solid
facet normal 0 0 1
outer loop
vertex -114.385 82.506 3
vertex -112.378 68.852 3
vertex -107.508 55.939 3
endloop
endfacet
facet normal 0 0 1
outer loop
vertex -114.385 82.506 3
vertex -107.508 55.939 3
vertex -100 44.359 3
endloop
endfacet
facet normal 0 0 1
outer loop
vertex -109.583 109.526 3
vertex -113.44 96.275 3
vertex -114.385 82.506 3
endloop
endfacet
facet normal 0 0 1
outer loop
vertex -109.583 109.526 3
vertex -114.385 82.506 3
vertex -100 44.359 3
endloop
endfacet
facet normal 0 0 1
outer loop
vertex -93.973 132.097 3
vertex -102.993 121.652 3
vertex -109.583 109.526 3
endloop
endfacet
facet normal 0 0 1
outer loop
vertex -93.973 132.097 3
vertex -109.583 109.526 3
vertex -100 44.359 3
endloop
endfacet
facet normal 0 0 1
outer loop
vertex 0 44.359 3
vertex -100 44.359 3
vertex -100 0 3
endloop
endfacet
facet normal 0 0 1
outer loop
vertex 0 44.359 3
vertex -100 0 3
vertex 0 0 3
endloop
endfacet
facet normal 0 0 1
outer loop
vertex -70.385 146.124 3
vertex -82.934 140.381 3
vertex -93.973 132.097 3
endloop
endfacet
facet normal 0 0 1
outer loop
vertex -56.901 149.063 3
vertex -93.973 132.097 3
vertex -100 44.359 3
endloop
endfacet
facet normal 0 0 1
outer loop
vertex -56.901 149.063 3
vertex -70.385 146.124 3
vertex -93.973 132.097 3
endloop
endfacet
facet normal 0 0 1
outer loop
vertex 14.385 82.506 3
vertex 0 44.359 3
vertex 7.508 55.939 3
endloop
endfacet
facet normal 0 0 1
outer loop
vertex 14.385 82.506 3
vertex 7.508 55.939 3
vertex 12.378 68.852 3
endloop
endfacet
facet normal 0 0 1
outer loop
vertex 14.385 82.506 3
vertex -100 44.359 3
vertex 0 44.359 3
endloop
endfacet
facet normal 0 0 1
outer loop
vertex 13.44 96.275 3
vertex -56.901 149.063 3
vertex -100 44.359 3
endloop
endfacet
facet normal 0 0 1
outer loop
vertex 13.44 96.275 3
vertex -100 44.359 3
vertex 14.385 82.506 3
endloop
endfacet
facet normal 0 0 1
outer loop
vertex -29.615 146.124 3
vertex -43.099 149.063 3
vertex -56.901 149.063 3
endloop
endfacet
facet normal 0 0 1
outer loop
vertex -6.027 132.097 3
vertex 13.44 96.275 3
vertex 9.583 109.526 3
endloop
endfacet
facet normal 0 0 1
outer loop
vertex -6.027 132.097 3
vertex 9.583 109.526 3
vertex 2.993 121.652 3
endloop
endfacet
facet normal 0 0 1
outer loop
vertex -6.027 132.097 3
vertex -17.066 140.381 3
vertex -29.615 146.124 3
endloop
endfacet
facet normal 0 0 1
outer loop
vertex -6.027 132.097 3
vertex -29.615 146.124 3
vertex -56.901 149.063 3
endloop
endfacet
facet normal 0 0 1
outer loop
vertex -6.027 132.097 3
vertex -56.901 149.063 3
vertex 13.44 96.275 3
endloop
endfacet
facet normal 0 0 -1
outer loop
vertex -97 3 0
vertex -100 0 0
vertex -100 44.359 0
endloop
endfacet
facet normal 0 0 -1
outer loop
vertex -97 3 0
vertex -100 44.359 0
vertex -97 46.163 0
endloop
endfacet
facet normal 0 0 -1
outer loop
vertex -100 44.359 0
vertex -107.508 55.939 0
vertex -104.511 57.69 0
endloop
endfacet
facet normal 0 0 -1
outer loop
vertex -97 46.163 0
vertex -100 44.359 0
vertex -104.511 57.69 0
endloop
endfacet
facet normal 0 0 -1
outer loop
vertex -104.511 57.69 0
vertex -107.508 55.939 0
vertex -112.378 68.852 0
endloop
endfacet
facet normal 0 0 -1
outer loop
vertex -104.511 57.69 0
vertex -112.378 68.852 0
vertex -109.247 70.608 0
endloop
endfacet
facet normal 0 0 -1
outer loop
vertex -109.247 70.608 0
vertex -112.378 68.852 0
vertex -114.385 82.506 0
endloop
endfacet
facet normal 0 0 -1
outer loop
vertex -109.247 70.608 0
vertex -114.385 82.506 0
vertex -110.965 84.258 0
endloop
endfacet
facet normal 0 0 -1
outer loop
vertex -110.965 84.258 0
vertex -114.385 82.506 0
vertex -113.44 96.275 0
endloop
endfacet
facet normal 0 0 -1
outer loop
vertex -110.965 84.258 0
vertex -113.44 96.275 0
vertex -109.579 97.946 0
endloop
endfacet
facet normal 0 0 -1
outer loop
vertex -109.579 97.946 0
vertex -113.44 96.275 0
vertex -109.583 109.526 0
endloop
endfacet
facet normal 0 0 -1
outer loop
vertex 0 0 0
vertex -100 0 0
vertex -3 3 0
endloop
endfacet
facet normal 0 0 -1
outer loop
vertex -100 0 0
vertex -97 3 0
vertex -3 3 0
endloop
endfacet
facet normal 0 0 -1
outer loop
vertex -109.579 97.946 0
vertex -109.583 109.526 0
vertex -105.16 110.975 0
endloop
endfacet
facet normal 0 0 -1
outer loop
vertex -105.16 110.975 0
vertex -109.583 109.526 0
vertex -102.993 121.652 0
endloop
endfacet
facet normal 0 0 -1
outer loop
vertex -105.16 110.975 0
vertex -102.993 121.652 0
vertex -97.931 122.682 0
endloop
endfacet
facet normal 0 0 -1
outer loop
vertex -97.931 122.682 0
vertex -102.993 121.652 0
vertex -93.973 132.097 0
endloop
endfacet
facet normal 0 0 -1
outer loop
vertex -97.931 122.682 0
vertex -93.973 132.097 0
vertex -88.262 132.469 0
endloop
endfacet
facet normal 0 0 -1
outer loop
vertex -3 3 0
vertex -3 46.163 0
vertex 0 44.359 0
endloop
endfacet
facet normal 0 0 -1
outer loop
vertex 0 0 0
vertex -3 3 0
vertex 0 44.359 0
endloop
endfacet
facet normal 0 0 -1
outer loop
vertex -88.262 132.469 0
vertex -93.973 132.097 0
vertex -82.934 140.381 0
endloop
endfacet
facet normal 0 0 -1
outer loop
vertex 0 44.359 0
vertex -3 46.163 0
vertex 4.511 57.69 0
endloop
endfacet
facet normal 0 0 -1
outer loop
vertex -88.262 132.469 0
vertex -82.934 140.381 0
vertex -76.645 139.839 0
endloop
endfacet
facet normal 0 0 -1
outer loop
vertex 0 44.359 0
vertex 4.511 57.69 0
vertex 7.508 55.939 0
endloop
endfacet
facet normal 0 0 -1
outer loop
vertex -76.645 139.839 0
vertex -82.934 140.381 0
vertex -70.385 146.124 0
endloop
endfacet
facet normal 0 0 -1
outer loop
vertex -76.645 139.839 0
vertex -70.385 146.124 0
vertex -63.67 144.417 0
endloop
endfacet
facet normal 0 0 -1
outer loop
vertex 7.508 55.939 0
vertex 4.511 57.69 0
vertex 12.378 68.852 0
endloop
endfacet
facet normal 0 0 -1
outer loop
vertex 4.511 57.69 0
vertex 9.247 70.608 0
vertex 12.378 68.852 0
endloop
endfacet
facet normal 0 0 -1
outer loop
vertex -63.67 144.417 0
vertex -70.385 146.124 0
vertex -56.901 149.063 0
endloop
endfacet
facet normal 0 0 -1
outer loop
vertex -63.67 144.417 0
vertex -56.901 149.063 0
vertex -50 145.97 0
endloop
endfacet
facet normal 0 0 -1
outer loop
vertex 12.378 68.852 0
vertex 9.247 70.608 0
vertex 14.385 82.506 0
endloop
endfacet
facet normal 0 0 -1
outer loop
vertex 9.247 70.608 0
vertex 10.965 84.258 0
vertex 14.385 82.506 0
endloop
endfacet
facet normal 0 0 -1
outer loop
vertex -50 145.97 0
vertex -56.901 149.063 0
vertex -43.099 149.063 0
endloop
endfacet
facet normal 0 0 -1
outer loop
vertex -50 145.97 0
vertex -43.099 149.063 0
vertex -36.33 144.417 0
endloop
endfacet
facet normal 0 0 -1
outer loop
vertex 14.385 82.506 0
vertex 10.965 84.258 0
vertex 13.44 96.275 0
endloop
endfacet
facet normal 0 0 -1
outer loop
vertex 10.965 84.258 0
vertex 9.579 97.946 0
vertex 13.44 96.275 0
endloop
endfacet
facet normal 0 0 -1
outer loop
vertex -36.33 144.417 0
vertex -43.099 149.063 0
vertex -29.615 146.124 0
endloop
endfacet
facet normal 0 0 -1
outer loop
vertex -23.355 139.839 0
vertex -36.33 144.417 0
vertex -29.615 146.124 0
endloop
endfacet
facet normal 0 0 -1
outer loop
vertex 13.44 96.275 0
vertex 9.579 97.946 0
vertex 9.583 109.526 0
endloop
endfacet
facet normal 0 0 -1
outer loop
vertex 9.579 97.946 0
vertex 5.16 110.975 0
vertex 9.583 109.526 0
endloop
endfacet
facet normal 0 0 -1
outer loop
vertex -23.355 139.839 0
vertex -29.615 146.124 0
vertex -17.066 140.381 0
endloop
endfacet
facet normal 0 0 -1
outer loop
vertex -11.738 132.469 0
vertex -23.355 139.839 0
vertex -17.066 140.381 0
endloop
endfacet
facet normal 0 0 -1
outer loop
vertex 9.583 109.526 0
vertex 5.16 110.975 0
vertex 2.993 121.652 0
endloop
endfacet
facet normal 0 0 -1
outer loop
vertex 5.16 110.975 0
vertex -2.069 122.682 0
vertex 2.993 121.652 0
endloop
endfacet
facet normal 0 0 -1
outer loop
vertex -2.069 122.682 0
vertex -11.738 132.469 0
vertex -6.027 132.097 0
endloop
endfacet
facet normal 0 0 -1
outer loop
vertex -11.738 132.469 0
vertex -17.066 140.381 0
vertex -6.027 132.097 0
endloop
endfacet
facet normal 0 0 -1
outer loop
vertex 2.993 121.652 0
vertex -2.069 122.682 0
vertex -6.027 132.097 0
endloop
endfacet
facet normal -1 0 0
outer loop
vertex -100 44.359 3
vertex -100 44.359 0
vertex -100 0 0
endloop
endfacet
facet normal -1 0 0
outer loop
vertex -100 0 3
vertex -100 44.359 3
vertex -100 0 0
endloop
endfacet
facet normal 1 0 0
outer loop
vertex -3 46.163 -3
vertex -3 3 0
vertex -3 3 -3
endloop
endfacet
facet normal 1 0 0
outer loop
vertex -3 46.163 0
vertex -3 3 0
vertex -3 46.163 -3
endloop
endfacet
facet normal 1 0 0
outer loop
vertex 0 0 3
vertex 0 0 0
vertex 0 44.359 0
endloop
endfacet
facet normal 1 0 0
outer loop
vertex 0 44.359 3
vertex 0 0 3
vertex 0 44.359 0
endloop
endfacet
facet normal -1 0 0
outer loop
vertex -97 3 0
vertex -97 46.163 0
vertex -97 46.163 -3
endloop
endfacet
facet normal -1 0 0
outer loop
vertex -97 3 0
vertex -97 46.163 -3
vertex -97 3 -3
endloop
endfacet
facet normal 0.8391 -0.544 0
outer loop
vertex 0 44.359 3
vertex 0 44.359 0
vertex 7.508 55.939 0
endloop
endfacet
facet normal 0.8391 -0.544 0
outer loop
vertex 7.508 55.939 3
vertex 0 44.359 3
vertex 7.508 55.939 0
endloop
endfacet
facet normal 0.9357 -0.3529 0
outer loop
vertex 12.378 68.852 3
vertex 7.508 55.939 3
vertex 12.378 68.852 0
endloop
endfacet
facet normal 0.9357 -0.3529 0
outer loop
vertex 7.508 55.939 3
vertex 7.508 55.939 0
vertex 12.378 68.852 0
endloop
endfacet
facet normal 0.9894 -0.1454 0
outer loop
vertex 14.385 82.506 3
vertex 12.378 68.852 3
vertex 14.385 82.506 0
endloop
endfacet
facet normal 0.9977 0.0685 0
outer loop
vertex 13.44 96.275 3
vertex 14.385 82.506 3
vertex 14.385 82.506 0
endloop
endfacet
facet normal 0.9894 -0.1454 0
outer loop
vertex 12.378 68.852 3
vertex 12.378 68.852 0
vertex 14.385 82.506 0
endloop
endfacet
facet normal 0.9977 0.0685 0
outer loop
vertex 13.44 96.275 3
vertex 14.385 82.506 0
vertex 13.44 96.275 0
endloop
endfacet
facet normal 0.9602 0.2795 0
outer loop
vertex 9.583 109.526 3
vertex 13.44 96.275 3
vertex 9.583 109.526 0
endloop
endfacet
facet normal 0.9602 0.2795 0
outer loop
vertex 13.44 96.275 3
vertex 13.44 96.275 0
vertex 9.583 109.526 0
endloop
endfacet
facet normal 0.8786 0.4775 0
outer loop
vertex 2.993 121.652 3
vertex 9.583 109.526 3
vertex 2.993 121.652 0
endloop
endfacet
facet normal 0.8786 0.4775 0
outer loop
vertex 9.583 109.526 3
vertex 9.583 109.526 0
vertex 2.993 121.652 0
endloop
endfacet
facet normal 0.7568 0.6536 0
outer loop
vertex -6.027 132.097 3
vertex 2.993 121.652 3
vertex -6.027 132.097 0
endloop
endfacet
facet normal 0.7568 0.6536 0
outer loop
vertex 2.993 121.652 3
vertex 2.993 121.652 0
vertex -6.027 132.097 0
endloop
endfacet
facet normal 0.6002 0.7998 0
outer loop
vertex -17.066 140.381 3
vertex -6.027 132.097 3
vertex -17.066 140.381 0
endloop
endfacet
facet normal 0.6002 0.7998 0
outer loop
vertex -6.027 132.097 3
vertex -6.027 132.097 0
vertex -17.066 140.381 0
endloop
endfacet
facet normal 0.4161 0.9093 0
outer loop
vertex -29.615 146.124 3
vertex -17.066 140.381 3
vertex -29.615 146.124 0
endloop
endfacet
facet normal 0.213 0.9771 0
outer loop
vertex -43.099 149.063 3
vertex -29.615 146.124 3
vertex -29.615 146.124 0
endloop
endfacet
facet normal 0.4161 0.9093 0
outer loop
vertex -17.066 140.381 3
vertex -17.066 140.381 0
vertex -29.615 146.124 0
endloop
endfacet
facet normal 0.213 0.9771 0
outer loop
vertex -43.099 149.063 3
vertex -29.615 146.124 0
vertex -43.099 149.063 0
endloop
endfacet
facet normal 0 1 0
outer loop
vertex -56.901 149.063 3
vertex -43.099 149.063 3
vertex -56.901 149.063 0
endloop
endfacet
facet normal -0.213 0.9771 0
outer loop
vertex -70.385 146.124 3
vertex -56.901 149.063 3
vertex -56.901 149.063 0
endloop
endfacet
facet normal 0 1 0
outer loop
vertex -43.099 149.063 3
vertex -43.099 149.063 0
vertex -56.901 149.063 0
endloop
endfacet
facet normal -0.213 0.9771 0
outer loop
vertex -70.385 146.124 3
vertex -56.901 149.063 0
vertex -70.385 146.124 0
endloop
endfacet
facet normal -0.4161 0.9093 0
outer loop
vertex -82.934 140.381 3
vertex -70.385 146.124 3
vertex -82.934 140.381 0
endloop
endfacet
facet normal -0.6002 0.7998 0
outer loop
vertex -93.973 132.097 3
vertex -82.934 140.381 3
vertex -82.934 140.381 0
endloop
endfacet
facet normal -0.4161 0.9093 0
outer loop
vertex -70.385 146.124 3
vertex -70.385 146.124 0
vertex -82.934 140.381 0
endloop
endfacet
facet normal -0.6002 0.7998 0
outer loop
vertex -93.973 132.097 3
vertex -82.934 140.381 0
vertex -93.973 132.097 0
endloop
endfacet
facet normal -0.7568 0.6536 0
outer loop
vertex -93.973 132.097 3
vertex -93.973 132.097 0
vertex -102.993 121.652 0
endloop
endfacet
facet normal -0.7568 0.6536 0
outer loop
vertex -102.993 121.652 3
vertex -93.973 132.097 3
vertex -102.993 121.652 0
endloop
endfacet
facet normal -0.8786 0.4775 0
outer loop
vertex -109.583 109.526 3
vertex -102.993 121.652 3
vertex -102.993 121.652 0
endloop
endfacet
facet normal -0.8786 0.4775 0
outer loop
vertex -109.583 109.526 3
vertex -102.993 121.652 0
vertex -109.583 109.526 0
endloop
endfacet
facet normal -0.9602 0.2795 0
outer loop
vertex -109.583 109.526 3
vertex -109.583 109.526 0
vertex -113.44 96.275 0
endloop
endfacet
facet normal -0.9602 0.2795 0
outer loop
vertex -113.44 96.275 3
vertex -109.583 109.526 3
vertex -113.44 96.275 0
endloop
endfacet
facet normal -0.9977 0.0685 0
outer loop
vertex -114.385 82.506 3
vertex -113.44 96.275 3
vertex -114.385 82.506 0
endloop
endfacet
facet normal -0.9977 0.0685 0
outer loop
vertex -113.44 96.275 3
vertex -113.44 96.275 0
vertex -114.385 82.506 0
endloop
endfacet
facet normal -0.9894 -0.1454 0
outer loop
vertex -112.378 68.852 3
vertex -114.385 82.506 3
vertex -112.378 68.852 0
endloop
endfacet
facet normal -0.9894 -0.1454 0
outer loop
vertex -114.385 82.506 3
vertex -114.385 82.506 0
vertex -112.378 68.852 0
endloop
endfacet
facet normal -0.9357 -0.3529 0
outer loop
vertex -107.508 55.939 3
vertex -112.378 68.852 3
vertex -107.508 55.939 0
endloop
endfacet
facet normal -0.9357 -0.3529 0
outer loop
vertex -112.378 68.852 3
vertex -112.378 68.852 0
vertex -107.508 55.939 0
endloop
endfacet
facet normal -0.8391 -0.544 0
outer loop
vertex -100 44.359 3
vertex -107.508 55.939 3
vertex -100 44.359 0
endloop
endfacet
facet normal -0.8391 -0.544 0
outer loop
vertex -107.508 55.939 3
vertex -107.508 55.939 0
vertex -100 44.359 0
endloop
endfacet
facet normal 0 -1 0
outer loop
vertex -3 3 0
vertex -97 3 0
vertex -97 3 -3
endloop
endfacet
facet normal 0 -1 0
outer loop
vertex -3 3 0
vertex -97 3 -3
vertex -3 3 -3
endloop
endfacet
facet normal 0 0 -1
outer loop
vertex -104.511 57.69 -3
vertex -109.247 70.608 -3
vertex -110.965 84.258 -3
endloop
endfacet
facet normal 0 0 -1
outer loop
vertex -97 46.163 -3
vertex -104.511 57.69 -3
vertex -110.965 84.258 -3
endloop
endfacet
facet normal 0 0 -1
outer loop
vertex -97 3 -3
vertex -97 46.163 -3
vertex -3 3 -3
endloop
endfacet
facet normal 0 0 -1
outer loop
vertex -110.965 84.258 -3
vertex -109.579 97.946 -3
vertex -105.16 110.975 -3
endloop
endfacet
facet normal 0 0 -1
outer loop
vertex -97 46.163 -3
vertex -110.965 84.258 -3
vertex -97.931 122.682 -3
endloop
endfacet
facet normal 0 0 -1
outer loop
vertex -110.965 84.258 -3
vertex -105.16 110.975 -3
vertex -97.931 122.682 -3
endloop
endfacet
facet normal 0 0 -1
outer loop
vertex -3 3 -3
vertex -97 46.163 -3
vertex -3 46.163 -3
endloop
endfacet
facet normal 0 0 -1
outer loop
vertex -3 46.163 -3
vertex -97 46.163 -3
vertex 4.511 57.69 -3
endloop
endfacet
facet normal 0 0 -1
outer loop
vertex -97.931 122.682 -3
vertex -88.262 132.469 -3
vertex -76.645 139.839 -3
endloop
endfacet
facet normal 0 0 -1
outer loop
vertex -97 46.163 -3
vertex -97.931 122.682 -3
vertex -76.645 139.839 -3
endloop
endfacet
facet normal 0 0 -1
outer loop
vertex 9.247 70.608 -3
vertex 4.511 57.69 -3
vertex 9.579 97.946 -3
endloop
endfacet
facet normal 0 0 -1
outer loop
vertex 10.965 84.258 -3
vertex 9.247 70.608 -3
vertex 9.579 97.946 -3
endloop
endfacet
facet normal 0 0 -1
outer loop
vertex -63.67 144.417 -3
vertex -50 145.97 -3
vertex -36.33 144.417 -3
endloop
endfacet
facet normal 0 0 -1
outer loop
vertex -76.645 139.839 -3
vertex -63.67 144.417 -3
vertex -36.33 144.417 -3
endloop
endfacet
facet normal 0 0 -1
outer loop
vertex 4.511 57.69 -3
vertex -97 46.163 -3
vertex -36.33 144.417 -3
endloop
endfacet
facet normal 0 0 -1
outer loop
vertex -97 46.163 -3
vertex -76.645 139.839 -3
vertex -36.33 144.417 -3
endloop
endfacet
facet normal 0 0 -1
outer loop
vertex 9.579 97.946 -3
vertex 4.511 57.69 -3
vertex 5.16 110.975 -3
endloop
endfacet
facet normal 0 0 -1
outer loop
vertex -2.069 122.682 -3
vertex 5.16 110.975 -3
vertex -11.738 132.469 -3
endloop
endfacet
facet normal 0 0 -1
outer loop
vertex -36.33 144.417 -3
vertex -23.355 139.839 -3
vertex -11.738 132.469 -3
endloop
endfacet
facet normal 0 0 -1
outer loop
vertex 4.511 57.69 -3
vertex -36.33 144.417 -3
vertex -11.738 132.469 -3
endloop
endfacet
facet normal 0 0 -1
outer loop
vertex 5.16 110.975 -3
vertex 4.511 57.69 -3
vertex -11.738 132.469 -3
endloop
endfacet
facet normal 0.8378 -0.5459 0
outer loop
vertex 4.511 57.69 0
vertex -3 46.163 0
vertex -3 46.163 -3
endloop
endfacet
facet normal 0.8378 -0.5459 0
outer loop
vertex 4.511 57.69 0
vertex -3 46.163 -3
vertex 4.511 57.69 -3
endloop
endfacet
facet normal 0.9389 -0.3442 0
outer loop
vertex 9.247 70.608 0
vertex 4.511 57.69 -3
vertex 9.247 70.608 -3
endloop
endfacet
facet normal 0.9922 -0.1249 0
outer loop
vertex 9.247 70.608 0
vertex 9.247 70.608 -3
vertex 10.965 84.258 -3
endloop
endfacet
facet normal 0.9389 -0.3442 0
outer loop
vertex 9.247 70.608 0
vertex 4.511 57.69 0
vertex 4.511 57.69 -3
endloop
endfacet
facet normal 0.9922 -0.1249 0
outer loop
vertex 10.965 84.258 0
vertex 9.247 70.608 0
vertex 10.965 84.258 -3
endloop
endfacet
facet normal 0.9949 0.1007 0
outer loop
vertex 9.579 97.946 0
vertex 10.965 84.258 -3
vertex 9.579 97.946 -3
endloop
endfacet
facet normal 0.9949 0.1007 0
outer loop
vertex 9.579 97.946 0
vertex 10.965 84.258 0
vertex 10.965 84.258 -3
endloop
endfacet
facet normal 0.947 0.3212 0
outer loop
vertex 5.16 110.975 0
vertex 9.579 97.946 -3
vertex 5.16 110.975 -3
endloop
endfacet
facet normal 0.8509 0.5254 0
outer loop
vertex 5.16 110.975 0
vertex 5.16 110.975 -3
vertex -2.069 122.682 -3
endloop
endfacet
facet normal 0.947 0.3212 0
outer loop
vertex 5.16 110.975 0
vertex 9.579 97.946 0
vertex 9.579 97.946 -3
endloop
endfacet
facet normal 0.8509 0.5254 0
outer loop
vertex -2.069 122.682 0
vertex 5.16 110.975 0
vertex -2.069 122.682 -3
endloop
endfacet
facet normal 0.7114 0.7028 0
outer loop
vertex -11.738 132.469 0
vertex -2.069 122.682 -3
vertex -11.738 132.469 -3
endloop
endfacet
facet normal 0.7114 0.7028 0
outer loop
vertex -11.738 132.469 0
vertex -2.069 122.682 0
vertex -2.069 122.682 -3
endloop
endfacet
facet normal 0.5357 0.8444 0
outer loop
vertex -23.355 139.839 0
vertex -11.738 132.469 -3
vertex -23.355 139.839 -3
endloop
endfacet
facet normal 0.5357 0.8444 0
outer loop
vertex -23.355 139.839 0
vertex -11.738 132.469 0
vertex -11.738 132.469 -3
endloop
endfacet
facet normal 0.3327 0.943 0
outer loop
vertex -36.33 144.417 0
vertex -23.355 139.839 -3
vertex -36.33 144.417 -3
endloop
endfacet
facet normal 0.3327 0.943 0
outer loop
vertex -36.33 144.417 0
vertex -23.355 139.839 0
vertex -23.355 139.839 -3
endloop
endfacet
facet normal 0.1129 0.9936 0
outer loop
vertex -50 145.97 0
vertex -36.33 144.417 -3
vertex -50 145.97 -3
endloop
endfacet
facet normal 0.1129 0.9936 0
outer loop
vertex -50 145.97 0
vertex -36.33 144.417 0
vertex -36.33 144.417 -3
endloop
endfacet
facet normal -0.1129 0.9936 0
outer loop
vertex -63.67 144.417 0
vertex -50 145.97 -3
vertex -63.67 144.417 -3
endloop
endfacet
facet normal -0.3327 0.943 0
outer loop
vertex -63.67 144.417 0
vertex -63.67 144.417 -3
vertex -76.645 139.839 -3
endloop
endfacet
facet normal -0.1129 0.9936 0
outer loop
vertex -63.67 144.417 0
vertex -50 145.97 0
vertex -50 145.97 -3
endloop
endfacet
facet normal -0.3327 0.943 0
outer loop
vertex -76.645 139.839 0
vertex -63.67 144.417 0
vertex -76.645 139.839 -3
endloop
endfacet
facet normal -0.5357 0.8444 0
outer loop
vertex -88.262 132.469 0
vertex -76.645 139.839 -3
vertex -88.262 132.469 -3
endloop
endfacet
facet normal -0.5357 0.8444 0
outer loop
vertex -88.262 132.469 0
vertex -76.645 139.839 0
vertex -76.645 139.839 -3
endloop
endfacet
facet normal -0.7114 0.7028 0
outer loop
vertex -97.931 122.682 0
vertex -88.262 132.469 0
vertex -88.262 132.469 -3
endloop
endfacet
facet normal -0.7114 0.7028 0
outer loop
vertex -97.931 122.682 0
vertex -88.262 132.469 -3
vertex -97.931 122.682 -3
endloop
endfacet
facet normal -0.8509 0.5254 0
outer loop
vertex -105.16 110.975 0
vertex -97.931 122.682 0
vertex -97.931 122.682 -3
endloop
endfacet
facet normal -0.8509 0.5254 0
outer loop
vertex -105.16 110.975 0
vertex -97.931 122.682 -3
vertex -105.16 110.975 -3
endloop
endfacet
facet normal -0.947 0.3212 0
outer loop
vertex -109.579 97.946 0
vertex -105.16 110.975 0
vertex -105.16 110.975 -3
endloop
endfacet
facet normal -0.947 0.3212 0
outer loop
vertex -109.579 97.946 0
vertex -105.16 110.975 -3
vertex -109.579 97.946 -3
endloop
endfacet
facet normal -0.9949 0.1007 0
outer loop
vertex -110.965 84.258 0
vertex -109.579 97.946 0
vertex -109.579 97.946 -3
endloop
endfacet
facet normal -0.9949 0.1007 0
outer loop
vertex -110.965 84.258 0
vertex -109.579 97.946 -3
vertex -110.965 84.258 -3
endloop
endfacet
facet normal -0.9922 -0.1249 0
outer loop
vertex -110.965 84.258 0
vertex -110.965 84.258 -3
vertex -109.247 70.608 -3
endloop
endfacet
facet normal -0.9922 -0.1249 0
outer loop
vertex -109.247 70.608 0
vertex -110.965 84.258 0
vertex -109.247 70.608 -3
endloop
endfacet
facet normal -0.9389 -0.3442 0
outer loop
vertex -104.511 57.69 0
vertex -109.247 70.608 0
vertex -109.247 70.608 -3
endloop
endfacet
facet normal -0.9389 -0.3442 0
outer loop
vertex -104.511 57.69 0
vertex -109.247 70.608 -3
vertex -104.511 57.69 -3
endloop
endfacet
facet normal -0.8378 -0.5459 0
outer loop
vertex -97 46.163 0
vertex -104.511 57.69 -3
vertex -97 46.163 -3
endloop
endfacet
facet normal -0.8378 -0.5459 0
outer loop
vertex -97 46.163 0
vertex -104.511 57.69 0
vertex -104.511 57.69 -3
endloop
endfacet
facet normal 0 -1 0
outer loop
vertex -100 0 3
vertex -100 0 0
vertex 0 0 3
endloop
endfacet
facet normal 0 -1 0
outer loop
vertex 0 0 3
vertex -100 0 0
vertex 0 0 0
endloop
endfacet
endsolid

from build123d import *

# Parameters (mm, degrees)
F1_DEPTH = 3
F2_DEPTH = 3


with BuildPart() as f1:
    # F0 (on Top) → F1 (new body)
    with BuildSketch(Plane.XY):
        with BuildLine():
            ThreePointArc((0, 44.3587770077), (-50, 149.4337567297), (-100, 44.3587770077))
            Line((-100, 44.3587770077), (-100, 0))
            Line((-100, 0), (0, 0))
            Line((0, 0), (0, 44.3587770077))
        make_face()
        with BuildLine():
            ThreePointArc((-97, 46.1631766902), (-50, 145.9696551146), (-3, 46.1631766902))
            Line((-3, 46.1631766902), (-3, 3))
            Line((-3, 3), (-97, 3))
            Line((-97, 3), (-97, 46.1631766902))
        make_face(mode=Mode.SUBTRACT)
        with BuildLine():
            Line((-3, 3), (-3, 46.1631766902))
            ThreePointArc((-3, 46.1631766902), (-50, 145.9696551146), (-97, 46.1631766902))
            Line((-97, 46.1631766902), (-97, 3))
            Line((-97, 3), (-3, 3))
        make_face()
    extrude(amount=F1_DEPTH)

    # F0 (on Top) → F2 (join)
    with BuildSketch(Plane.XY):
        with BuildLine():
            Line((-3, 3), (-3, 46.1631766902))
            ThreePointArc((-3, 46.1631766902), (-50, 145.9696551146), (-97, 46.1631766902))
            Line((-97, 46.1631766902), (-97, 3))
            Line((-97, 3), (-3, 3))
        make_face()
    extrude(amount=-F2_DEPTH)


solid = f1.part
